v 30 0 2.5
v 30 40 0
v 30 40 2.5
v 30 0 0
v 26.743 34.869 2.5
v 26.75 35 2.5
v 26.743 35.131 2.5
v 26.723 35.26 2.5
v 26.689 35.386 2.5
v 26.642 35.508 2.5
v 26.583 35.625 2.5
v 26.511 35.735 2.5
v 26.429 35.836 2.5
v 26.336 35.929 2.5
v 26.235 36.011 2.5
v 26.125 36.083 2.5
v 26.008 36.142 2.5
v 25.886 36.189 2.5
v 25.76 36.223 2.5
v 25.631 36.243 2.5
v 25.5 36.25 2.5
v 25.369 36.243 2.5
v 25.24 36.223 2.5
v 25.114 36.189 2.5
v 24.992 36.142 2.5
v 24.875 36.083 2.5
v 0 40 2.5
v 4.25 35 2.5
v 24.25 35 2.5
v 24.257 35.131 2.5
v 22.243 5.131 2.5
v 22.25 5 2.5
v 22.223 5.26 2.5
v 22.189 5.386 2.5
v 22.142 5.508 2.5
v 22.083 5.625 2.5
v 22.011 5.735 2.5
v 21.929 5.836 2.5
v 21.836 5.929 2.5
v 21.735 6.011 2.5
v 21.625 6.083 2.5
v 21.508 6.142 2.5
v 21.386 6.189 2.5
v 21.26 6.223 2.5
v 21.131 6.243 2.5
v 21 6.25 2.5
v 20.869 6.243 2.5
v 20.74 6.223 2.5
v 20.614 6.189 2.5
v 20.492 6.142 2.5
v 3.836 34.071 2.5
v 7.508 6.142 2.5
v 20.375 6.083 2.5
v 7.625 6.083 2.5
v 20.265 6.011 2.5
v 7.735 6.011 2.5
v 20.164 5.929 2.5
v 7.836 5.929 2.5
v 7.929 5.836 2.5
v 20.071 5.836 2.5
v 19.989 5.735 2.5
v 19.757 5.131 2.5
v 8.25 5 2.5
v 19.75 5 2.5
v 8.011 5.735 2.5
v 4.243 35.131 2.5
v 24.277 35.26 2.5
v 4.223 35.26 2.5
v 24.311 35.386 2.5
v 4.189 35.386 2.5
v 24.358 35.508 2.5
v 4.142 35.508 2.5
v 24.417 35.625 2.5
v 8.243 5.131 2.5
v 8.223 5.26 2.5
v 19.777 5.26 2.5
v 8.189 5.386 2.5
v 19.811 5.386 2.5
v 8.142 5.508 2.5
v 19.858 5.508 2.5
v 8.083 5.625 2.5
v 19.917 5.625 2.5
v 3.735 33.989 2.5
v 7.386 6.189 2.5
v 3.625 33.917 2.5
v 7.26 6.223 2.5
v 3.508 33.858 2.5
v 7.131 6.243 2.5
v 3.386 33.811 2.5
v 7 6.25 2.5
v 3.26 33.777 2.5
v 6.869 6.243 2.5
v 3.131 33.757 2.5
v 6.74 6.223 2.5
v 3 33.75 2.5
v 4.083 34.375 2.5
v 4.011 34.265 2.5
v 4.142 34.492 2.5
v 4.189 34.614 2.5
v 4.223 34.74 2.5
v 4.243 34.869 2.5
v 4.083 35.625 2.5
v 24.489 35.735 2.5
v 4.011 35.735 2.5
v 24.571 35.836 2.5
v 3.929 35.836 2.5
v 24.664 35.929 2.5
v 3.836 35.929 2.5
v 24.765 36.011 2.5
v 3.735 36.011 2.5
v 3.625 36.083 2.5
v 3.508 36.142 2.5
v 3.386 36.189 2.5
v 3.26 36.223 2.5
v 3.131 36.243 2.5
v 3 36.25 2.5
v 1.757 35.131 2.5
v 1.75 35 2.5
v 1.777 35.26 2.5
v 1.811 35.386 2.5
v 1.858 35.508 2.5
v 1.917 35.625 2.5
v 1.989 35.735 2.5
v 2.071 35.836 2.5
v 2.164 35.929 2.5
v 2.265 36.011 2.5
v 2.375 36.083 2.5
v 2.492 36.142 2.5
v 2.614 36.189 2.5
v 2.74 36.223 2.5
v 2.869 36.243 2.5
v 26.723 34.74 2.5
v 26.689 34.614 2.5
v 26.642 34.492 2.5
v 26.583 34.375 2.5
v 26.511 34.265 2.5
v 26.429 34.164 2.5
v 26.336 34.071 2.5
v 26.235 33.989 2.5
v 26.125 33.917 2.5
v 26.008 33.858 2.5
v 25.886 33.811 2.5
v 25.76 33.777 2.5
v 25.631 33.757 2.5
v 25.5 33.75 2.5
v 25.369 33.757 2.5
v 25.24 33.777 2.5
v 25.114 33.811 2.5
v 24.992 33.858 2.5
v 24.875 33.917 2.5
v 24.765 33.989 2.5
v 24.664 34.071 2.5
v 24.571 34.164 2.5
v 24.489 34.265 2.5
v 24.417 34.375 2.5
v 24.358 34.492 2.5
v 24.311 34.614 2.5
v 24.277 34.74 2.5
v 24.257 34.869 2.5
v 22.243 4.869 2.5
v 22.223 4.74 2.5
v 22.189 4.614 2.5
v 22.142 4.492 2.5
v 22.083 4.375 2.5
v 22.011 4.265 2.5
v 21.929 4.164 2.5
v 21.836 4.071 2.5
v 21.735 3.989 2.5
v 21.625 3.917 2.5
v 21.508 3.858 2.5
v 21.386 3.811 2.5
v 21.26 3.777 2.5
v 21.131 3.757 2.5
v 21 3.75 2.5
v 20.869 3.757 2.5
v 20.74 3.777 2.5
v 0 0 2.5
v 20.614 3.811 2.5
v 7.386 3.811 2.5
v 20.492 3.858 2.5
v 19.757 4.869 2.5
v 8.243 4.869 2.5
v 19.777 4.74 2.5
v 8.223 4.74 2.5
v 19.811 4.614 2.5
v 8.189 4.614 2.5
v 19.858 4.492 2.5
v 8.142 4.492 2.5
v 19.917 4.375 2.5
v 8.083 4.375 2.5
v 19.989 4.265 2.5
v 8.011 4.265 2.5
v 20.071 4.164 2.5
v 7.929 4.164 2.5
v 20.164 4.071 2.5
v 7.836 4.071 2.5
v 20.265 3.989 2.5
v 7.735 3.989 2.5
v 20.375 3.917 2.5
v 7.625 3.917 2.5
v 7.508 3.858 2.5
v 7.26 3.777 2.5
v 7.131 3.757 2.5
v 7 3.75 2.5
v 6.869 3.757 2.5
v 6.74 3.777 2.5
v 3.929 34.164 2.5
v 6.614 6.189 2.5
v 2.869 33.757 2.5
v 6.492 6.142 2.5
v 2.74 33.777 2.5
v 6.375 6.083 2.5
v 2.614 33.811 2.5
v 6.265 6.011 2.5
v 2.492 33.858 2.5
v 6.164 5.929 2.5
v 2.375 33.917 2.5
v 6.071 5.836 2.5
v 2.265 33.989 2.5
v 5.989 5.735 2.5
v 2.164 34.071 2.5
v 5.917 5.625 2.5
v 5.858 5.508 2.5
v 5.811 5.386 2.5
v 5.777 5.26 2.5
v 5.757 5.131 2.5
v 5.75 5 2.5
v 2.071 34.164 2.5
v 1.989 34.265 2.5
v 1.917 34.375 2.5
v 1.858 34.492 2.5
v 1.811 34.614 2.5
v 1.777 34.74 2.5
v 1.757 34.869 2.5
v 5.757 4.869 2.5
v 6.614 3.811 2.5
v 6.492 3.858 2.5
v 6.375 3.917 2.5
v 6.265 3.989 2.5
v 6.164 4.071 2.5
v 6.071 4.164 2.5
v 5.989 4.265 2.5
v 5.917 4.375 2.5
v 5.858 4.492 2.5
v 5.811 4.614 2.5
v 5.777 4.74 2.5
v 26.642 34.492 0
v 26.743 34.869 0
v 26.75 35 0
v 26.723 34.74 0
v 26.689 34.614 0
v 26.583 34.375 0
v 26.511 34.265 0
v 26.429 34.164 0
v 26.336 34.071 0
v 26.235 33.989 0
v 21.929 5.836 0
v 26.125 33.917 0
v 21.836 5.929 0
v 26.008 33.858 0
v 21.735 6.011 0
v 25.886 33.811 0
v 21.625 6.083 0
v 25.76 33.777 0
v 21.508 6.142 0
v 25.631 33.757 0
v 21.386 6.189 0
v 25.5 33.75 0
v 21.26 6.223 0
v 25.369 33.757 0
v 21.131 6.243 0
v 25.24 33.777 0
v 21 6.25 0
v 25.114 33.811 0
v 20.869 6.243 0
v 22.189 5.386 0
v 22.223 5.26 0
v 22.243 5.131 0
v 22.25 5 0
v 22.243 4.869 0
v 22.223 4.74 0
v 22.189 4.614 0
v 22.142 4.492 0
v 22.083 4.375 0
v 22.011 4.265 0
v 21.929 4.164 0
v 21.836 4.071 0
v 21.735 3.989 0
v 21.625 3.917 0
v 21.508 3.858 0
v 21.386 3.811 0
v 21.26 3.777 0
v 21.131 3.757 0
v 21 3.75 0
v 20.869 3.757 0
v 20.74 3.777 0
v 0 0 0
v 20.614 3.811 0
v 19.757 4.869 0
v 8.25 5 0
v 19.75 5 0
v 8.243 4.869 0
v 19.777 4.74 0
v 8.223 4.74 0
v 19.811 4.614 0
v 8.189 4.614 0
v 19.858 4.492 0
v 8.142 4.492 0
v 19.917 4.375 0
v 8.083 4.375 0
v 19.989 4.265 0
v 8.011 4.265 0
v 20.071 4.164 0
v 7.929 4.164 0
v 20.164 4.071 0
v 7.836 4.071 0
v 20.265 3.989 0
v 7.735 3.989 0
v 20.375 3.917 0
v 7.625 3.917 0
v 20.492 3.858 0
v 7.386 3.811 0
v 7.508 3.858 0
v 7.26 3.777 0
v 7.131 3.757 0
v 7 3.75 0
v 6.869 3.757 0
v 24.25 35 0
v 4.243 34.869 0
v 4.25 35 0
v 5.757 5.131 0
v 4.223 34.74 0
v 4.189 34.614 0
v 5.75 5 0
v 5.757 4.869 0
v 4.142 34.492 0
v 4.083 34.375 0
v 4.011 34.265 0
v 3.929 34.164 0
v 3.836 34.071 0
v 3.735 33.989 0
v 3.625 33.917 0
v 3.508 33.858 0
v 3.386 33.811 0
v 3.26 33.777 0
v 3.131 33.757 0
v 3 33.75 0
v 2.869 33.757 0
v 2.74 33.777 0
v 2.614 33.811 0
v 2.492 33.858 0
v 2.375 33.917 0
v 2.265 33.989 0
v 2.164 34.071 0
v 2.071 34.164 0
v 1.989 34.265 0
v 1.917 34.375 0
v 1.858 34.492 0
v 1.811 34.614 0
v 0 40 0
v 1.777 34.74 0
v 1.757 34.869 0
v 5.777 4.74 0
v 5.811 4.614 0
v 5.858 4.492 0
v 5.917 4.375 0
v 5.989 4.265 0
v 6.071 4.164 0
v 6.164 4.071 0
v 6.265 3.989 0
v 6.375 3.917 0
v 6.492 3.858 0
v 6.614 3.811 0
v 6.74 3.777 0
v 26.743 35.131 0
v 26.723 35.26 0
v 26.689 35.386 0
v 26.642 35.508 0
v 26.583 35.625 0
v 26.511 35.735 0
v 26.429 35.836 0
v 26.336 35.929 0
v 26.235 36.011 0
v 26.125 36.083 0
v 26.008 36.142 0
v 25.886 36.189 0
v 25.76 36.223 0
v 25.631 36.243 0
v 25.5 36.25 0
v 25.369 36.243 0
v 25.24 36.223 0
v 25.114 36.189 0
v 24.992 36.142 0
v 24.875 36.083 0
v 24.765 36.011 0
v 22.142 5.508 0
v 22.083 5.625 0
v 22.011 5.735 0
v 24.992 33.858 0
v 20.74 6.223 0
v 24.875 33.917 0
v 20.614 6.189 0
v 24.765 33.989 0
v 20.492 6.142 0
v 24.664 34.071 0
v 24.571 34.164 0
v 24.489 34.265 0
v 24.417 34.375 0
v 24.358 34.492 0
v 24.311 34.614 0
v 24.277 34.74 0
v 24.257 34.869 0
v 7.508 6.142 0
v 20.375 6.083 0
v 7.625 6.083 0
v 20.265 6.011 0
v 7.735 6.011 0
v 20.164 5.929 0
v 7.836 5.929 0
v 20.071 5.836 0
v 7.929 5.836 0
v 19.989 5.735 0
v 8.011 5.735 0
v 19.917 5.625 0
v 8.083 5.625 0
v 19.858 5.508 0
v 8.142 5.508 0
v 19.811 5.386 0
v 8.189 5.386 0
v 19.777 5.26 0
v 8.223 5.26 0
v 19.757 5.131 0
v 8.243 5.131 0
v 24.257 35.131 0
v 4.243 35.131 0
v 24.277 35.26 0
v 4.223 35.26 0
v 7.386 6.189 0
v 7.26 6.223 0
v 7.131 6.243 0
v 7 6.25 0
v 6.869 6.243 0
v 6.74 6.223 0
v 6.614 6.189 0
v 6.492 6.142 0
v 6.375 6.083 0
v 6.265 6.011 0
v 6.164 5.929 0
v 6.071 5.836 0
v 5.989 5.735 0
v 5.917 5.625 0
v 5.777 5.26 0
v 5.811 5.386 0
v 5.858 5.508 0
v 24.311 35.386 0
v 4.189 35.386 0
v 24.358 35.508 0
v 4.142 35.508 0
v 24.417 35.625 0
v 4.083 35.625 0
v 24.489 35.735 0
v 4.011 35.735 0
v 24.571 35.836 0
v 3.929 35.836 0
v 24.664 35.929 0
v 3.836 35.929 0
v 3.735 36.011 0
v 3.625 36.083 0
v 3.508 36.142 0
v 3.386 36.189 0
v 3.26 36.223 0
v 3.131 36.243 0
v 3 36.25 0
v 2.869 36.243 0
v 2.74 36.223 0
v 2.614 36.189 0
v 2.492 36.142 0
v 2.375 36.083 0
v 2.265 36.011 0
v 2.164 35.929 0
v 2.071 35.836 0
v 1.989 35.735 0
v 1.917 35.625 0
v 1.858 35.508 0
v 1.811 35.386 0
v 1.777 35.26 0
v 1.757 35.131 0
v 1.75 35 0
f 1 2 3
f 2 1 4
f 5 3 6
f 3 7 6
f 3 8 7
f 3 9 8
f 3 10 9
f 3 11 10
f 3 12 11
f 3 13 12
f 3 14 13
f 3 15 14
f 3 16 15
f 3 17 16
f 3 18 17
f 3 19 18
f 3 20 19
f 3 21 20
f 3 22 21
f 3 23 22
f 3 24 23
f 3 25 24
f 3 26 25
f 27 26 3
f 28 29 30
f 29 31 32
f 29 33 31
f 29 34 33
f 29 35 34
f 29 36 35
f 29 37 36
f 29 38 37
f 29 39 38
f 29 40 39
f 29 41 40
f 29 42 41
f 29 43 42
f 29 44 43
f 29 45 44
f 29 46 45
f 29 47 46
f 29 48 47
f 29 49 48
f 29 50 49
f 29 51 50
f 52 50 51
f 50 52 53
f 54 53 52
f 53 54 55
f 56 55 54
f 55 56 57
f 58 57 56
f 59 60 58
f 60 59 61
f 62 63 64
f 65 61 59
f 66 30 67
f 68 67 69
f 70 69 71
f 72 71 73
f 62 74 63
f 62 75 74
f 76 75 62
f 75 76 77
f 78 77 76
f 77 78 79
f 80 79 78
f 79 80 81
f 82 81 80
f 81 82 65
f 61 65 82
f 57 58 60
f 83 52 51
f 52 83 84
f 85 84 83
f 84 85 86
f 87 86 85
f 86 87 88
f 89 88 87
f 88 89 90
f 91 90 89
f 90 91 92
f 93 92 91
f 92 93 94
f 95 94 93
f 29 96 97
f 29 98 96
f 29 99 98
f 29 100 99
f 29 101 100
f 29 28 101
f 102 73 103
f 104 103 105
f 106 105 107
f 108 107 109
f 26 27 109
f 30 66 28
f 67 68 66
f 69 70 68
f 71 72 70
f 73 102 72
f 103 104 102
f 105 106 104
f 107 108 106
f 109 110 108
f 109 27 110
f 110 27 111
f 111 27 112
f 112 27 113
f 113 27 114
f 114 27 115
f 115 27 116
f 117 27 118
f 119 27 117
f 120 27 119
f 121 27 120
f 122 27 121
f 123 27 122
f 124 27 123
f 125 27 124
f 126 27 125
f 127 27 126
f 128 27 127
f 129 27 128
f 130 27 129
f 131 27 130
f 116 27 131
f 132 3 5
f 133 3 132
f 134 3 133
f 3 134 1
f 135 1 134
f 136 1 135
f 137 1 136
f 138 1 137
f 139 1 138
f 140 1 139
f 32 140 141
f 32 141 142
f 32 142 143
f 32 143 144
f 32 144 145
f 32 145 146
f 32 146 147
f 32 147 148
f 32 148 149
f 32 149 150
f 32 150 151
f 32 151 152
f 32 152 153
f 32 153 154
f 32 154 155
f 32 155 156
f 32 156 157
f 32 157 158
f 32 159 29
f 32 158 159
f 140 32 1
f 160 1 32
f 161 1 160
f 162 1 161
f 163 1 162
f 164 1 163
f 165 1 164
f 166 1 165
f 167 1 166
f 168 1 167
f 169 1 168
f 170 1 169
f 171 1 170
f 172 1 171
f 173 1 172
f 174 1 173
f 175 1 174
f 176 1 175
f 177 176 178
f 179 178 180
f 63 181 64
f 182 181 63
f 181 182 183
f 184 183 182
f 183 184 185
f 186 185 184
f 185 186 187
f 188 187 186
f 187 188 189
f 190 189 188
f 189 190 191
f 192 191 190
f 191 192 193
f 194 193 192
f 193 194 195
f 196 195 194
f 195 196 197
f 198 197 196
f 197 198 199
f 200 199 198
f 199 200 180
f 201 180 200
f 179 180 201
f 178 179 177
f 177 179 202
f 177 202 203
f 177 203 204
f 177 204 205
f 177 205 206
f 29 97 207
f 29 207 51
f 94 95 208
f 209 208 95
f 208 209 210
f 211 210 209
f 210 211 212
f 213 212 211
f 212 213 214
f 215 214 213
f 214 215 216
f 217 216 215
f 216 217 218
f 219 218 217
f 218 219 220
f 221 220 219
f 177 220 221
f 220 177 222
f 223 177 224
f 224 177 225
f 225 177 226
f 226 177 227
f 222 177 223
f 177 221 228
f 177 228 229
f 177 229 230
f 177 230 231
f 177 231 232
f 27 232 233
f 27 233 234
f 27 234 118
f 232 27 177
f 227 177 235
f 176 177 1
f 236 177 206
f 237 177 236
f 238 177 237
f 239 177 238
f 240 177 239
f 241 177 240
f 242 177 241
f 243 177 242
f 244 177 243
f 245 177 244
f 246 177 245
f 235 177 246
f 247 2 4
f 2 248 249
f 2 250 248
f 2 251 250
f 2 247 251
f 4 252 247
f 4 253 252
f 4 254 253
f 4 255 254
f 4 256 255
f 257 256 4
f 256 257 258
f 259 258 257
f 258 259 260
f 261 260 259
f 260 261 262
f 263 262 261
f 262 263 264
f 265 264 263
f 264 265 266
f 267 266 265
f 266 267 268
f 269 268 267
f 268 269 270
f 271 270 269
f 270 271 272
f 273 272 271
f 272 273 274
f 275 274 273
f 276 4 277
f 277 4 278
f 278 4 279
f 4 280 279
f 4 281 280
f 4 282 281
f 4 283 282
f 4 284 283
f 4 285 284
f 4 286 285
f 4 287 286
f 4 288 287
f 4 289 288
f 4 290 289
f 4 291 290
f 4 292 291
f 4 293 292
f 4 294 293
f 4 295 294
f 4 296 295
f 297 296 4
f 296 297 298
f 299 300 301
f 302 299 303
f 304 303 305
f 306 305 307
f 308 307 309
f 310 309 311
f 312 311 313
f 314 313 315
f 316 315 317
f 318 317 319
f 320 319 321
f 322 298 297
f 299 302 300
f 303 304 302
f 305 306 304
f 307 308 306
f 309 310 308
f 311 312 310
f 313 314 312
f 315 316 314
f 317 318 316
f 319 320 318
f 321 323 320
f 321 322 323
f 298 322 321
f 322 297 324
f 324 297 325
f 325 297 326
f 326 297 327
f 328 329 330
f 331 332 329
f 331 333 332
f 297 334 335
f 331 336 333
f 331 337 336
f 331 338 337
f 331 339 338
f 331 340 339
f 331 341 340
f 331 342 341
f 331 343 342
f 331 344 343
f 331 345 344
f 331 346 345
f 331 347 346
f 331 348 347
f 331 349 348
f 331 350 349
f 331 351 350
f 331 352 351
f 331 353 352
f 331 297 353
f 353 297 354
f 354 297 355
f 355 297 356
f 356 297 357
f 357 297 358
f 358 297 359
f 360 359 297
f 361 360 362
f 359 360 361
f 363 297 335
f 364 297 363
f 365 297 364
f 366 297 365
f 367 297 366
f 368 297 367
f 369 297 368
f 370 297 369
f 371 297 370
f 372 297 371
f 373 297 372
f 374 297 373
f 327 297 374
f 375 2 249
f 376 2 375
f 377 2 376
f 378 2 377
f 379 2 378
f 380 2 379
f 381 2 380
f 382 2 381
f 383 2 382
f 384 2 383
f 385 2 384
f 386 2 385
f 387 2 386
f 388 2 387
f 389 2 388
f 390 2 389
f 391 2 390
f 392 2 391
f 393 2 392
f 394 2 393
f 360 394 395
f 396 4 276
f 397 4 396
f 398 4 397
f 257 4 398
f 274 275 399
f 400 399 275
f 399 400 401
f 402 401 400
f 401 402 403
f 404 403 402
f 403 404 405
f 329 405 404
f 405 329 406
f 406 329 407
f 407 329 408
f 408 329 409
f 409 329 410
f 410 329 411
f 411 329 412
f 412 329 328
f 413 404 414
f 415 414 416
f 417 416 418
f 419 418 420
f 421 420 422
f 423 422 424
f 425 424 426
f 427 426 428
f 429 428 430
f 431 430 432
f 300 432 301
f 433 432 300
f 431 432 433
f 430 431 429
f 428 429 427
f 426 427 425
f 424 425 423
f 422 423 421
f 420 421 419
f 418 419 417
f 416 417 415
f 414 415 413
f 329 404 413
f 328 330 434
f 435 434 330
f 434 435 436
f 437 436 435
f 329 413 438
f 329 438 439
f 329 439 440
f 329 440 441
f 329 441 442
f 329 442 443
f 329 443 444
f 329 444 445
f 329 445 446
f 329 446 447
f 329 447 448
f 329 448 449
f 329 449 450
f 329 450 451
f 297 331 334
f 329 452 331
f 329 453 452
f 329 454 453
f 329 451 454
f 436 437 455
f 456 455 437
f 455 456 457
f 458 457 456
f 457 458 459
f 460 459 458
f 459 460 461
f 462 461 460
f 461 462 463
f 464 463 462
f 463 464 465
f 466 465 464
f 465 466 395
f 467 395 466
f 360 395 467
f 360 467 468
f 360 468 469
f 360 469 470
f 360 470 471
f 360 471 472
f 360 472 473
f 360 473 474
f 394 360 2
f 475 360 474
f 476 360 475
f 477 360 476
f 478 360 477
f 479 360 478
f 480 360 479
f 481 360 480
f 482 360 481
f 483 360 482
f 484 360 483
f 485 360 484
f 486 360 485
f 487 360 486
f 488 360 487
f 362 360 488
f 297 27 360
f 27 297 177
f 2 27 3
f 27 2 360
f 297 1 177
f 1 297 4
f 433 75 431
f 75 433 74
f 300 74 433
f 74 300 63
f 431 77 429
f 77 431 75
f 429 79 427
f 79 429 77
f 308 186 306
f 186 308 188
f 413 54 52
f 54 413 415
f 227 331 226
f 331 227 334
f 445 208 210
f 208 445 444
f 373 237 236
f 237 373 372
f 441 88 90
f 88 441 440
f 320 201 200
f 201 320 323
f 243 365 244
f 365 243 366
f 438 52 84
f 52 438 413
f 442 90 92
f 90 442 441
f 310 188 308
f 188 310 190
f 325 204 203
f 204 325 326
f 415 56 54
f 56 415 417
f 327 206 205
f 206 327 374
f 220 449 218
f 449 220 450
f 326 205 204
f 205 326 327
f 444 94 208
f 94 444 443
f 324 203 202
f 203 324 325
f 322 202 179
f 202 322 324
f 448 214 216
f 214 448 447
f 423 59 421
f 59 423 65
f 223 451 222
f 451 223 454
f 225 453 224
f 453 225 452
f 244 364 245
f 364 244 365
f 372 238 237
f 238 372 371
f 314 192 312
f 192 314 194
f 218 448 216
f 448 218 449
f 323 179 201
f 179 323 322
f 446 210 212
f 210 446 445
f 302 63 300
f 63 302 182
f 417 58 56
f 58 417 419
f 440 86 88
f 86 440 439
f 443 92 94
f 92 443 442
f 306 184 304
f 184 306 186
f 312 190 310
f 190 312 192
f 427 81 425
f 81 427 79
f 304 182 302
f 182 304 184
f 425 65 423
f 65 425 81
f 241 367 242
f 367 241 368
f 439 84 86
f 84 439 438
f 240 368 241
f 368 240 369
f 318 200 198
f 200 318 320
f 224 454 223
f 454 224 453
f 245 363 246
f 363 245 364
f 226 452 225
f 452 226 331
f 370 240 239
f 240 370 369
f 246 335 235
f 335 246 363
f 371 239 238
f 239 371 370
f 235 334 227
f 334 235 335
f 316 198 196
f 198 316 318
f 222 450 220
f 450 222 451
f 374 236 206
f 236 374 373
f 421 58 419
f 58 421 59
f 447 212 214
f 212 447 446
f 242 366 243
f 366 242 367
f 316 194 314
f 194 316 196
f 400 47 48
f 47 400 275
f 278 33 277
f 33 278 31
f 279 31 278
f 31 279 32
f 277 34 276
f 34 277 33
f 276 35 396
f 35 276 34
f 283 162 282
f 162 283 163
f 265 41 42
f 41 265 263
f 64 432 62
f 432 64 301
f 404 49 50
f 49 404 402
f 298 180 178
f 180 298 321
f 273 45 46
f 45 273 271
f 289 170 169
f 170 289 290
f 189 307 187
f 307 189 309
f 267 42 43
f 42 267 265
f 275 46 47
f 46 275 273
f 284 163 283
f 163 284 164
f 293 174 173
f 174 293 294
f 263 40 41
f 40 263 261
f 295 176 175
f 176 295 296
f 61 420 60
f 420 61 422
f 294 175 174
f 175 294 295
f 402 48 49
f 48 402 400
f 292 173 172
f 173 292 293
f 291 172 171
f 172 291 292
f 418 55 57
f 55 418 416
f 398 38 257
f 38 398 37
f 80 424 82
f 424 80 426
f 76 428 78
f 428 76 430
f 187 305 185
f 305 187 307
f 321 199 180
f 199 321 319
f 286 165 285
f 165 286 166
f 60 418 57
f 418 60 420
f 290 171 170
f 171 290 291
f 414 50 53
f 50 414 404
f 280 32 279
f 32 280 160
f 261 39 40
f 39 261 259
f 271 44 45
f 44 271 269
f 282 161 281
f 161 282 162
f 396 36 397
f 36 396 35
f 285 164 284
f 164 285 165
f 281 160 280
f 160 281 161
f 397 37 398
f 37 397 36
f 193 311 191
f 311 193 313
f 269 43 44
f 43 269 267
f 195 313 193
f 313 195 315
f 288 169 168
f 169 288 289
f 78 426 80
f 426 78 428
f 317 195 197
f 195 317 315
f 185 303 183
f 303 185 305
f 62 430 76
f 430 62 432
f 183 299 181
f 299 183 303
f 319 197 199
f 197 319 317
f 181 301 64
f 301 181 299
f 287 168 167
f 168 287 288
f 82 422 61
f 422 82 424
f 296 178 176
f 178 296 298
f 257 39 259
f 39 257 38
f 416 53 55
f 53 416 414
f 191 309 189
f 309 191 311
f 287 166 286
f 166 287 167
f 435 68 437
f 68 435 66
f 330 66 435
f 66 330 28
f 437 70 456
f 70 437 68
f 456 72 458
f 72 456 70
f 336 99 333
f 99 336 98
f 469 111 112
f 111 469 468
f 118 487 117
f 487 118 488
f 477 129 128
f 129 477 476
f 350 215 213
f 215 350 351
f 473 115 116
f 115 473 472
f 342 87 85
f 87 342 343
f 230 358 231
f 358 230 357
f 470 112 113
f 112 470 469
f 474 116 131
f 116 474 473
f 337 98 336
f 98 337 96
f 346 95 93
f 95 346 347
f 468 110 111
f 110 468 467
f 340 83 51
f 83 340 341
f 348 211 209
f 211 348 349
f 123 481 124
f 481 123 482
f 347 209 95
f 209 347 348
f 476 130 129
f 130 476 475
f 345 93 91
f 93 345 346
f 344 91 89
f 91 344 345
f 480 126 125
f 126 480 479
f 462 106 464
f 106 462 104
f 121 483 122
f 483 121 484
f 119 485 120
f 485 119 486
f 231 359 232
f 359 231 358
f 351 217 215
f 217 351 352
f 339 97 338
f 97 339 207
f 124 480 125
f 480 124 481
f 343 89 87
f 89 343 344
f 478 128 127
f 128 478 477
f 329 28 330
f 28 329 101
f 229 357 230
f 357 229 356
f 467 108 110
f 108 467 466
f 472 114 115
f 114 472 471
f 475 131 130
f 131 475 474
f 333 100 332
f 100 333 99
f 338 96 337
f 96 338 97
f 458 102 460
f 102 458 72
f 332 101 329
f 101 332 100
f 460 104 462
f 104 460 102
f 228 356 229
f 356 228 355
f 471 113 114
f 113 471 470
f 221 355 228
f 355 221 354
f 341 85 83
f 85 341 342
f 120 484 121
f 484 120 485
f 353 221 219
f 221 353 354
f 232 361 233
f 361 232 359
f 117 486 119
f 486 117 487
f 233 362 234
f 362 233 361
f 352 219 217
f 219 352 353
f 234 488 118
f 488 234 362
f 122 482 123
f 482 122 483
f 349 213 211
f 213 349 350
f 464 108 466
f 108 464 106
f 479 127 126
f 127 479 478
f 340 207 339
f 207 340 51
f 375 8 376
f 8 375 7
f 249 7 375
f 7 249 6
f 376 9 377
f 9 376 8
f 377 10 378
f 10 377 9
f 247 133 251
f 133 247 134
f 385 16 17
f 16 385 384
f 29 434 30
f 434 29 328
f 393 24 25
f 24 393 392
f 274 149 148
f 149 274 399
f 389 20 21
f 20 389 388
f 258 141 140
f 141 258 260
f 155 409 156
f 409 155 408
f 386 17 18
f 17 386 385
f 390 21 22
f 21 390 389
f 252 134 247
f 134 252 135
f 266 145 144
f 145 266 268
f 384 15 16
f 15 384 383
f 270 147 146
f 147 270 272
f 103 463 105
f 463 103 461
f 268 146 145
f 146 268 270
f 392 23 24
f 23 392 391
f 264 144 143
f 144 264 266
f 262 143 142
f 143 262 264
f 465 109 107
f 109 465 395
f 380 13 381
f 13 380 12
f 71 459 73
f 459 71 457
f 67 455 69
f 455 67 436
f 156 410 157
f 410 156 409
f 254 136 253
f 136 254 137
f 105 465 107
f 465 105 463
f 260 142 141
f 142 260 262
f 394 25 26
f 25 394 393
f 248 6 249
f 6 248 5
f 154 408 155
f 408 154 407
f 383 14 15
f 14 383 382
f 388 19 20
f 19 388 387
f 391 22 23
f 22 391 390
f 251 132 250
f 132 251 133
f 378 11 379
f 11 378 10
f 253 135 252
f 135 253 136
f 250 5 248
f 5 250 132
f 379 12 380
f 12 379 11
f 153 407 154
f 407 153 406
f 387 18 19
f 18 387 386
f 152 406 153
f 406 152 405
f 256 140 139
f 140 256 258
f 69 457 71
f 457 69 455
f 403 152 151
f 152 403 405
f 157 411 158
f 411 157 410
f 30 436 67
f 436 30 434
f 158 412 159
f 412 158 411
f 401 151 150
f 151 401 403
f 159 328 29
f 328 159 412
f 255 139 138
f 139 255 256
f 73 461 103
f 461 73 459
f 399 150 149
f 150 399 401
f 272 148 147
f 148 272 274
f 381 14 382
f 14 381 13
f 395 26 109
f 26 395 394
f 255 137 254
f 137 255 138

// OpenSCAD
// file: wntrmute.scad
function M2() = 1;
function M25() = 1.25;
function M3() = 1.75;
function M4() = 2.1;
function PlateHeight() = 2.5;
    

module screw_hole(size, x, y, height=PlateHeight()+1) {
    union() {
       translate([x, y, -1])
       cylinder(h=5, r=size, $fn=60); 
    };
}

// x and y are the center point for the battery mount.
module battery_mount(x, y, size=M3(), rotation=0) {
    offset = 19.5 / 2;
    union() {
        screw_hole(size, x-offset, y);
        screw_hole(size, x+offset, y);
    }
}

module arduino_uno(x, y, size=M3(), rotation=0) {
    union() {
        screw_hole(size, x, y); 
        screw_hole(size, x+50.8, y-15.2);
        screw_hole(size, x+50.8, y-43.1);
        screw_hole(size, x, y-48.3);
    }
}

module robot_power_board(x, y, size=M3(), rotation=0) {
    union() {
        screw_hole(size, x, y);
        screw_hole(size, x+31.5, y);
        screw_hole(size, x, y+18.5);
        screw_hole(size, x+31.5, y+18.5);
    }
}

module raspberry_pi_zero(x, y, size=M3(), rotation=0) {
    union () {
        screw_hole(size, x, y);
        screw_hole(size, x+58, y);
        screw_hole(size, x, y+23);
        screw_hole(size, x+58, y+23);
    }
}

module raspberry_pi_3(x, y, size=M3(), rotation=0) {
    union () {
        screw_hole(size, x, y);
        screw_hole(size, x+58, y);
        screw_hole(size, x, y+49);
        screw_hole(size, x+58, y+49);
    }
}

module ultrasonic_mount(x, y, size=M3(), rotation=undef) {
    //rotate(rotation?rotation:[0,0,0])
    union() {
        screw_hole(size, x, y);
        screw_hole(size, x+13, y);
    }
}
// main file
use <wntrmute.scad>;

difference () {
    cube([30, 40, PlateHeight()]);
    screw_hole(M25(), 7, 5);
    screw_hole(M25(), 21, 5);
    screw_hole(M25(), 3, 35);
    screw_hole(M25(), 25.5, 35);
//    ultrasonic_mount(3, 15);
}
